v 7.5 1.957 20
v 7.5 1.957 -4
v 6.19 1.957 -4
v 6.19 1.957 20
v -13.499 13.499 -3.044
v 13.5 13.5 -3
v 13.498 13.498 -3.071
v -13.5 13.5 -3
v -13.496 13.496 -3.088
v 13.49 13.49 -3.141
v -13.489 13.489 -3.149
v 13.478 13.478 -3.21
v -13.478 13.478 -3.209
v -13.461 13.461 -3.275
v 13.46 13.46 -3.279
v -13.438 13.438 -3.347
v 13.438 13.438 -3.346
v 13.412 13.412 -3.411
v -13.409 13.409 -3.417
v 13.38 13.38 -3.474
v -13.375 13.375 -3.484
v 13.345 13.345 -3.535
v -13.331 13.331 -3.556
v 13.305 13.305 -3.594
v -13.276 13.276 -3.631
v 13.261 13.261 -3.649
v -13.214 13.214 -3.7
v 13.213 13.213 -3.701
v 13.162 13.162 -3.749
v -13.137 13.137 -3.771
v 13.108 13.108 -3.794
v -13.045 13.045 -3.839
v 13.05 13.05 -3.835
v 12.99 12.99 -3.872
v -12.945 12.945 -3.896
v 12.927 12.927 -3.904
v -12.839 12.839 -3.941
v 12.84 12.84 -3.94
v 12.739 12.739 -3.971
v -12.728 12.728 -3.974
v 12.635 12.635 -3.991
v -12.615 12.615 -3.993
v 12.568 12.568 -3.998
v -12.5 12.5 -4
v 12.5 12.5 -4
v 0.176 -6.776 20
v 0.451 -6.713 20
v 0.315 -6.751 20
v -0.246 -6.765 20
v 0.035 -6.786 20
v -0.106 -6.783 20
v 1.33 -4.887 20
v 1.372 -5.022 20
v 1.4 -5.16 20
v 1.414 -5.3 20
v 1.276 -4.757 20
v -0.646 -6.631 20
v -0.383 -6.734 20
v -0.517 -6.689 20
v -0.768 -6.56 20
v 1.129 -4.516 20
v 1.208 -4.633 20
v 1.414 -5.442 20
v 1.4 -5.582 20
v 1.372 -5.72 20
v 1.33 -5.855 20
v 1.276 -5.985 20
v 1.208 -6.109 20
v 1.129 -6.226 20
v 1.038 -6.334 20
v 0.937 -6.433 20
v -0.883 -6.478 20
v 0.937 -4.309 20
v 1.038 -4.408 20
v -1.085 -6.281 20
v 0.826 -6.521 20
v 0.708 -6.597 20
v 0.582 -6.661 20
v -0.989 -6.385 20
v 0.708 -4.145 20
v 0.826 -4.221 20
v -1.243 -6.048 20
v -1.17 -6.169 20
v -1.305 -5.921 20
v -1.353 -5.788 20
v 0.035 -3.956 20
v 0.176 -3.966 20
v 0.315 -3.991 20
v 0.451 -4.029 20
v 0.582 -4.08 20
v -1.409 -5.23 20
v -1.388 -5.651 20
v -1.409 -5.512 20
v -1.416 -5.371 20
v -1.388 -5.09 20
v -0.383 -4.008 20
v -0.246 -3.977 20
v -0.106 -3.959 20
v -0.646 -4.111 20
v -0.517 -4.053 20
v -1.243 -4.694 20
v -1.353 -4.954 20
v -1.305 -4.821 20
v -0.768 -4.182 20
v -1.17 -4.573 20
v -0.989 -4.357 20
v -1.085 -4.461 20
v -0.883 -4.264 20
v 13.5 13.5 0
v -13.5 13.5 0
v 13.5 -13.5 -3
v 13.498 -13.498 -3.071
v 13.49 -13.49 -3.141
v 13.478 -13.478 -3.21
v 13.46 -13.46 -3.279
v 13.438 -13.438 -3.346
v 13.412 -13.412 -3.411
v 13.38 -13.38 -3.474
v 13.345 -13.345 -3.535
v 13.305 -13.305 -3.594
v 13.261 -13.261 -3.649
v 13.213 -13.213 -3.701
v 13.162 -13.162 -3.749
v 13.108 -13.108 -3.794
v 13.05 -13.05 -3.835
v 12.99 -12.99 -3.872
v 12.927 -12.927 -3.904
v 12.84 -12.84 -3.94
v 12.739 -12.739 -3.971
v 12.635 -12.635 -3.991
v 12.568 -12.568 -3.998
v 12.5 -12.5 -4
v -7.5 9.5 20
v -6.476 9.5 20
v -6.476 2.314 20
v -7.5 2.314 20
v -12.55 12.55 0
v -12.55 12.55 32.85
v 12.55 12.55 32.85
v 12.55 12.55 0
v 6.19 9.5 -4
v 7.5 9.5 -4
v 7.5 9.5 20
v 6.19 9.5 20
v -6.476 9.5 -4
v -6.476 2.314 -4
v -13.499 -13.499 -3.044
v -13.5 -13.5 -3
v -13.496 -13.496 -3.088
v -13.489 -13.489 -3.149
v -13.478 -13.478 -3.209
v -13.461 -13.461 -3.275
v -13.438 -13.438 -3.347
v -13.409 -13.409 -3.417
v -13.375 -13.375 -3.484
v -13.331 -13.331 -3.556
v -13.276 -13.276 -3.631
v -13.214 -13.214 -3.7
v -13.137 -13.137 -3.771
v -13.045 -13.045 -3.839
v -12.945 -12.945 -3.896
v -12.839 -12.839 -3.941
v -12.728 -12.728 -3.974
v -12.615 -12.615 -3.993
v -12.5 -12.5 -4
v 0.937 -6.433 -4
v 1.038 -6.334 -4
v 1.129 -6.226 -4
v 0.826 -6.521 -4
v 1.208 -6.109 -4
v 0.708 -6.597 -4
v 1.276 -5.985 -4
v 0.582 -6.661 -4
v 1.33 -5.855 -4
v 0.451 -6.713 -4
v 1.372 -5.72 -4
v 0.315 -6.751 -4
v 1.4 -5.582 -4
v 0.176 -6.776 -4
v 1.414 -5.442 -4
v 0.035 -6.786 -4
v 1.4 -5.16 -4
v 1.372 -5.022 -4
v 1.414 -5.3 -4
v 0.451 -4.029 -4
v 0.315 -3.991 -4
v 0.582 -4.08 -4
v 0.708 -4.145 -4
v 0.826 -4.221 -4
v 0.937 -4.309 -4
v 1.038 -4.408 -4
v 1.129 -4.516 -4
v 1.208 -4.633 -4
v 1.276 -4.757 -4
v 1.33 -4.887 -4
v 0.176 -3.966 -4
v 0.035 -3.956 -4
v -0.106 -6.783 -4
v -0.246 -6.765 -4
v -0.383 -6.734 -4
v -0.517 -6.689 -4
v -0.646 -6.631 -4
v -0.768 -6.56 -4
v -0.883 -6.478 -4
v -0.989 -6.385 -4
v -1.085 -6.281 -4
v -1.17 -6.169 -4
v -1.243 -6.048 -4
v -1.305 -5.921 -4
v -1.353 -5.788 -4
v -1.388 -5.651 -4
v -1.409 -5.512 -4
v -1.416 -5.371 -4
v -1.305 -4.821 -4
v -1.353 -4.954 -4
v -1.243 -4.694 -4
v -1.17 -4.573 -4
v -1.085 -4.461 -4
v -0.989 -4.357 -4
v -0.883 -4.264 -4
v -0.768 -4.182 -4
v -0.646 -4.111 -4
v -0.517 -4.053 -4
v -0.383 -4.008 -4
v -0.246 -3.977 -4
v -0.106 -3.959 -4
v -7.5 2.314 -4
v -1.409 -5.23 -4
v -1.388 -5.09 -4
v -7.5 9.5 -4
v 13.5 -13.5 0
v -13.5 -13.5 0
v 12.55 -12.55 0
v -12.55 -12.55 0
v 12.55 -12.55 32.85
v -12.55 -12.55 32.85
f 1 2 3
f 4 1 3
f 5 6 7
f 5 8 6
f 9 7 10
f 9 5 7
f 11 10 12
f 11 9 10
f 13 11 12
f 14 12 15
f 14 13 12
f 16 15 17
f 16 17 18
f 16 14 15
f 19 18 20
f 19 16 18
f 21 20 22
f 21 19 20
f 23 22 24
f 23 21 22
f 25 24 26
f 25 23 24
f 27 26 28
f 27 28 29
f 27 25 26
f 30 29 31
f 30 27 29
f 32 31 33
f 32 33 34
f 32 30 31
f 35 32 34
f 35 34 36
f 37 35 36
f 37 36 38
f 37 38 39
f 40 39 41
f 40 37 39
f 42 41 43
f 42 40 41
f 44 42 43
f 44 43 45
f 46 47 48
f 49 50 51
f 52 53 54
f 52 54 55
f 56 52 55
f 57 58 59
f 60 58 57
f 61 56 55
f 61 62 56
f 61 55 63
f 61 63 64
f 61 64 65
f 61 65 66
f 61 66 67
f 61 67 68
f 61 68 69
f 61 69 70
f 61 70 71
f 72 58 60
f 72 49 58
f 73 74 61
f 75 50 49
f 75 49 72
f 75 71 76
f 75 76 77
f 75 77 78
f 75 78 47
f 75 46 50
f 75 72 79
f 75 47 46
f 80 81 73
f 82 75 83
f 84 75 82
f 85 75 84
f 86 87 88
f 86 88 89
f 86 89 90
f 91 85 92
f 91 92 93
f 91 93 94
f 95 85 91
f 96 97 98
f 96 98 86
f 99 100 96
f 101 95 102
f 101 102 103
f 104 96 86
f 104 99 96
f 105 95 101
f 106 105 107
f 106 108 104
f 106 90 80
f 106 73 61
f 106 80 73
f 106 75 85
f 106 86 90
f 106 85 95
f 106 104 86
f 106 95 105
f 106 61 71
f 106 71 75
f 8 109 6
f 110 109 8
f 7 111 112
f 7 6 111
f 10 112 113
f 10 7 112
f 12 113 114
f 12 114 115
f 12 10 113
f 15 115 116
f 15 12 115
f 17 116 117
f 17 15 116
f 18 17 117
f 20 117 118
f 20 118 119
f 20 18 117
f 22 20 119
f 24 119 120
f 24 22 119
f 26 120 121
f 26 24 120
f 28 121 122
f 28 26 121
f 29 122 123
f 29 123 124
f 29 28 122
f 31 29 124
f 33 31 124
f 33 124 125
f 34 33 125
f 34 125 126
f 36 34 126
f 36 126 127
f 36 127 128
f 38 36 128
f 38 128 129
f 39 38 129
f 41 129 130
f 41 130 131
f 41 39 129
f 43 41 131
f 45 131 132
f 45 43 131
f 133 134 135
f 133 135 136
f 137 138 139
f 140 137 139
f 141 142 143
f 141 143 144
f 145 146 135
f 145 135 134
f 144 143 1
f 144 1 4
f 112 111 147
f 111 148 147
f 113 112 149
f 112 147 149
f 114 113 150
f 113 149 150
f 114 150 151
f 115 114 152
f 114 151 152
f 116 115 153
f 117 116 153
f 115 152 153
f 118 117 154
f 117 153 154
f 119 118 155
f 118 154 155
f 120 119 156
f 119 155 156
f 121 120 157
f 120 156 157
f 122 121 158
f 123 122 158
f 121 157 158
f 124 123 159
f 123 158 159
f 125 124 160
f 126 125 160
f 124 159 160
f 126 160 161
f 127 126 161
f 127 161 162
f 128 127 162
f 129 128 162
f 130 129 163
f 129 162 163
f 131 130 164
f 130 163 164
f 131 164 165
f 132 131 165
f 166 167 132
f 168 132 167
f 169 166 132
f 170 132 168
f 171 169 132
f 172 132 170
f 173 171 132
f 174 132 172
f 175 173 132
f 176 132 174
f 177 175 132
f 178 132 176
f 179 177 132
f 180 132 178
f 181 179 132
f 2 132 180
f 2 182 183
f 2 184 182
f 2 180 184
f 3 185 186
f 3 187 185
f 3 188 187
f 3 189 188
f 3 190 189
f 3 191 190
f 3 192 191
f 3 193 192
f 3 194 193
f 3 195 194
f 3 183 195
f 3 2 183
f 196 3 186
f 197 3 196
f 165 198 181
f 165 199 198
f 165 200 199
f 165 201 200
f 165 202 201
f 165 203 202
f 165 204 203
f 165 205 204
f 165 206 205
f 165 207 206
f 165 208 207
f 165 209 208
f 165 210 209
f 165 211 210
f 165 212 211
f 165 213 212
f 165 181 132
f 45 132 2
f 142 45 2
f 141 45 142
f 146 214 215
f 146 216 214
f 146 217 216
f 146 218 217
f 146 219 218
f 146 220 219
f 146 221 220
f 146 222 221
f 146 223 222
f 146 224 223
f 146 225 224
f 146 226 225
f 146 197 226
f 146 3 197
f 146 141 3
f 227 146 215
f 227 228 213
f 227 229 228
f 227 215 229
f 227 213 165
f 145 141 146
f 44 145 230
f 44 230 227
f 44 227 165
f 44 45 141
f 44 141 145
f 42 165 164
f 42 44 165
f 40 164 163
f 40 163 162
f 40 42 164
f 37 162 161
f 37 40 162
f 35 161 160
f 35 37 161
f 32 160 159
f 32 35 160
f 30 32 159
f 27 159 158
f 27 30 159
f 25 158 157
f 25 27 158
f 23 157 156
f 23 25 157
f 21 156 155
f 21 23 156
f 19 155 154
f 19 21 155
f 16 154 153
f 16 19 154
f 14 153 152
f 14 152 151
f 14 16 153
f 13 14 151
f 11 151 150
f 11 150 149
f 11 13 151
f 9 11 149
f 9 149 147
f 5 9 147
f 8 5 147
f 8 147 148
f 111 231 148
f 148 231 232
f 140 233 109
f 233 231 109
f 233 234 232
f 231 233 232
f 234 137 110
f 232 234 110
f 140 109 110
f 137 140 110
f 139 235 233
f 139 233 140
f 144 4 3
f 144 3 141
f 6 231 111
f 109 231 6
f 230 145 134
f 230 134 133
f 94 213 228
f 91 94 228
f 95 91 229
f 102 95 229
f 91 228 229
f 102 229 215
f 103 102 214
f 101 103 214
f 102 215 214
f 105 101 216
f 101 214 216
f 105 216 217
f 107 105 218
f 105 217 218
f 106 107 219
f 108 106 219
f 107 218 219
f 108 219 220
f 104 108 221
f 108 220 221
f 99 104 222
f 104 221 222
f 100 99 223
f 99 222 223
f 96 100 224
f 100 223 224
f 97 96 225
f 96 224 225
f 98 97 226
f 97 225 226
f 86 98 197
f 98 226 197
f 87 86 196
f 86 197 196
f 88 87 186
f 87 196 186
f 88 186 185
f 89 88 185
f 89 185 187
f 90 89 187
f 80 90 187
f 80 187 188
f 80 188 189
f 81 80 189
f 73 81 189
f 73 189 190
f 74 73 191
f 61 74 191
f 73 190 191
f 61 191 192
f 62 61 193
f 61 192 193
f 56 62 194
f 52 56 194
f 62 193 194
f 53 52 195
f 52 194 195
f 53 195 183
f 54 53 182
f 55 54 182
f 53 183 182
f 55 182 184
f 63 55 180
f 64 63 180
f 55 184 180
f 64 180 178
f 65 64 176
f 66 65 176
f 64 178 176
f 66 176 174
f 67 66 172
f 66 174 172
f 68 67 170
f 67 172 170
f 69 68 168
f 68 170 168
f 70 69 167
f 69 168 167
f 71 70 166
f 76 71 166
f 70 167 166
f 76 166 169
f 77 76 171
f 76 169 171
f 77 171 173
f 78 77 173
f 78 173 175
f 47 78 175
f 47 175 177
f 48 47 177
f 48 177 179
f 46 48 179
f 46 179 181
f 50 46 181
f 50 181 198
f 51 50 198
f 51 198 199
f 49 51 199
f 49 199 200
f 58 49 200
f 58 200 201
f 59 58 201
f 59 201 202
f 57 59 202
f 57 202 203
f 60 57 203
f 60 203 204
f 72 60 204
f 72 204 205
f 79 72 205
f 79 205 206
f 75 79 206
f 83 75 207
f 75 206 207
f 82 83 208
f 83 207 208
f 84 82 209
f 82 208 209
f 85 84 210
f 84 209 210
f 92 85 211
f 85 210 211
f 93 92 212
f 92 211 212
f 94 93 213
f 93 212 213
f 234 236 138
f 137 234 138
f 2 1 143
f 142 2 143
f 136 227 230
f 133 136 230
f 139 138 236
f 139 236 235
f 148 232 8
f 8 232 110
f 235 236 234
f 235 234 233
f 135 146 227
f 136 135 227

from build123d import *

# Parameters (mm, degrees)
SKETCH1_W           = 25.1
SKETCH1_H           = 25.1
BOSS_EXTRUDE1_DEPTH = 32.85
SKETCH2_W           = 27
SKETCH2_H           = 27
BOSS_EXTRUDE2_DEPTH = 4
FILLET1_R           = 1
SKETCH3_R           = 1.415831881
SKETCH3_W           = 1.309672559
SKETCH3_H           = 7.543446756
SKETCH3_W_2         = 1.023845508
SKETCH3_H_2         = 7.18639052
CUT_EXTRUDE1_DEPTH  = 24


with BuildPart() as part:
    # Sketch1 → Boss-Extrude1 (new body)
    with BuildSketch(Plane.XY):
        Rectangle(SKETCH1_W, SKETCH1_H)
    extrude(amount=BOSS_EXTRUDE1_DEPTH)

    # Sketch2 → Boss-Extrude2 (add)
    with BuildSketch(Plane(origin=(0, 0, 0), x_dir=(-1, 0, 0), z_dir=(0, 0, -1))):
        Rectangle(SKETCH2_W, SKETCH2_H)
    extrude(amount=BOSS_EXTRUDE2_DEPTH)

    # Fillet1
    fillet1_edges = [part.edges().sort_by_distance(p)[0] for p in [
        (-13.5, 0, -4),
        (0, 13.5, -4),
        (13.5, 0, -4),
        (0, -13.5, -4),
    ]]
    fillet(fillet1_edges, radius=FILLET1_R)

    # Sketch3 → Cut-Extrude1 (cut)
    with BuildSketch(Plane(origin=(0, 0, -4), x_dir=(-1, 0, 0), z_dir=(0, 0, -1))):
        with Locations((0, -5.370956585)):
            Circle(SKETCH3_R)
        with Locations((-6.845163721, 5.728276622)):
            Rectangle(SKETCH3_W, SKETCH3_H)
        with Locations((6.988077246, 5.90680474)):
            Rectangle(SKETCH3_W_2, SKETCH3_H_2)
    extrude(amount=-CUT_EXTRUDE1_DEPTH, mode=Mode.SUBTRACT)


solid = part.part
